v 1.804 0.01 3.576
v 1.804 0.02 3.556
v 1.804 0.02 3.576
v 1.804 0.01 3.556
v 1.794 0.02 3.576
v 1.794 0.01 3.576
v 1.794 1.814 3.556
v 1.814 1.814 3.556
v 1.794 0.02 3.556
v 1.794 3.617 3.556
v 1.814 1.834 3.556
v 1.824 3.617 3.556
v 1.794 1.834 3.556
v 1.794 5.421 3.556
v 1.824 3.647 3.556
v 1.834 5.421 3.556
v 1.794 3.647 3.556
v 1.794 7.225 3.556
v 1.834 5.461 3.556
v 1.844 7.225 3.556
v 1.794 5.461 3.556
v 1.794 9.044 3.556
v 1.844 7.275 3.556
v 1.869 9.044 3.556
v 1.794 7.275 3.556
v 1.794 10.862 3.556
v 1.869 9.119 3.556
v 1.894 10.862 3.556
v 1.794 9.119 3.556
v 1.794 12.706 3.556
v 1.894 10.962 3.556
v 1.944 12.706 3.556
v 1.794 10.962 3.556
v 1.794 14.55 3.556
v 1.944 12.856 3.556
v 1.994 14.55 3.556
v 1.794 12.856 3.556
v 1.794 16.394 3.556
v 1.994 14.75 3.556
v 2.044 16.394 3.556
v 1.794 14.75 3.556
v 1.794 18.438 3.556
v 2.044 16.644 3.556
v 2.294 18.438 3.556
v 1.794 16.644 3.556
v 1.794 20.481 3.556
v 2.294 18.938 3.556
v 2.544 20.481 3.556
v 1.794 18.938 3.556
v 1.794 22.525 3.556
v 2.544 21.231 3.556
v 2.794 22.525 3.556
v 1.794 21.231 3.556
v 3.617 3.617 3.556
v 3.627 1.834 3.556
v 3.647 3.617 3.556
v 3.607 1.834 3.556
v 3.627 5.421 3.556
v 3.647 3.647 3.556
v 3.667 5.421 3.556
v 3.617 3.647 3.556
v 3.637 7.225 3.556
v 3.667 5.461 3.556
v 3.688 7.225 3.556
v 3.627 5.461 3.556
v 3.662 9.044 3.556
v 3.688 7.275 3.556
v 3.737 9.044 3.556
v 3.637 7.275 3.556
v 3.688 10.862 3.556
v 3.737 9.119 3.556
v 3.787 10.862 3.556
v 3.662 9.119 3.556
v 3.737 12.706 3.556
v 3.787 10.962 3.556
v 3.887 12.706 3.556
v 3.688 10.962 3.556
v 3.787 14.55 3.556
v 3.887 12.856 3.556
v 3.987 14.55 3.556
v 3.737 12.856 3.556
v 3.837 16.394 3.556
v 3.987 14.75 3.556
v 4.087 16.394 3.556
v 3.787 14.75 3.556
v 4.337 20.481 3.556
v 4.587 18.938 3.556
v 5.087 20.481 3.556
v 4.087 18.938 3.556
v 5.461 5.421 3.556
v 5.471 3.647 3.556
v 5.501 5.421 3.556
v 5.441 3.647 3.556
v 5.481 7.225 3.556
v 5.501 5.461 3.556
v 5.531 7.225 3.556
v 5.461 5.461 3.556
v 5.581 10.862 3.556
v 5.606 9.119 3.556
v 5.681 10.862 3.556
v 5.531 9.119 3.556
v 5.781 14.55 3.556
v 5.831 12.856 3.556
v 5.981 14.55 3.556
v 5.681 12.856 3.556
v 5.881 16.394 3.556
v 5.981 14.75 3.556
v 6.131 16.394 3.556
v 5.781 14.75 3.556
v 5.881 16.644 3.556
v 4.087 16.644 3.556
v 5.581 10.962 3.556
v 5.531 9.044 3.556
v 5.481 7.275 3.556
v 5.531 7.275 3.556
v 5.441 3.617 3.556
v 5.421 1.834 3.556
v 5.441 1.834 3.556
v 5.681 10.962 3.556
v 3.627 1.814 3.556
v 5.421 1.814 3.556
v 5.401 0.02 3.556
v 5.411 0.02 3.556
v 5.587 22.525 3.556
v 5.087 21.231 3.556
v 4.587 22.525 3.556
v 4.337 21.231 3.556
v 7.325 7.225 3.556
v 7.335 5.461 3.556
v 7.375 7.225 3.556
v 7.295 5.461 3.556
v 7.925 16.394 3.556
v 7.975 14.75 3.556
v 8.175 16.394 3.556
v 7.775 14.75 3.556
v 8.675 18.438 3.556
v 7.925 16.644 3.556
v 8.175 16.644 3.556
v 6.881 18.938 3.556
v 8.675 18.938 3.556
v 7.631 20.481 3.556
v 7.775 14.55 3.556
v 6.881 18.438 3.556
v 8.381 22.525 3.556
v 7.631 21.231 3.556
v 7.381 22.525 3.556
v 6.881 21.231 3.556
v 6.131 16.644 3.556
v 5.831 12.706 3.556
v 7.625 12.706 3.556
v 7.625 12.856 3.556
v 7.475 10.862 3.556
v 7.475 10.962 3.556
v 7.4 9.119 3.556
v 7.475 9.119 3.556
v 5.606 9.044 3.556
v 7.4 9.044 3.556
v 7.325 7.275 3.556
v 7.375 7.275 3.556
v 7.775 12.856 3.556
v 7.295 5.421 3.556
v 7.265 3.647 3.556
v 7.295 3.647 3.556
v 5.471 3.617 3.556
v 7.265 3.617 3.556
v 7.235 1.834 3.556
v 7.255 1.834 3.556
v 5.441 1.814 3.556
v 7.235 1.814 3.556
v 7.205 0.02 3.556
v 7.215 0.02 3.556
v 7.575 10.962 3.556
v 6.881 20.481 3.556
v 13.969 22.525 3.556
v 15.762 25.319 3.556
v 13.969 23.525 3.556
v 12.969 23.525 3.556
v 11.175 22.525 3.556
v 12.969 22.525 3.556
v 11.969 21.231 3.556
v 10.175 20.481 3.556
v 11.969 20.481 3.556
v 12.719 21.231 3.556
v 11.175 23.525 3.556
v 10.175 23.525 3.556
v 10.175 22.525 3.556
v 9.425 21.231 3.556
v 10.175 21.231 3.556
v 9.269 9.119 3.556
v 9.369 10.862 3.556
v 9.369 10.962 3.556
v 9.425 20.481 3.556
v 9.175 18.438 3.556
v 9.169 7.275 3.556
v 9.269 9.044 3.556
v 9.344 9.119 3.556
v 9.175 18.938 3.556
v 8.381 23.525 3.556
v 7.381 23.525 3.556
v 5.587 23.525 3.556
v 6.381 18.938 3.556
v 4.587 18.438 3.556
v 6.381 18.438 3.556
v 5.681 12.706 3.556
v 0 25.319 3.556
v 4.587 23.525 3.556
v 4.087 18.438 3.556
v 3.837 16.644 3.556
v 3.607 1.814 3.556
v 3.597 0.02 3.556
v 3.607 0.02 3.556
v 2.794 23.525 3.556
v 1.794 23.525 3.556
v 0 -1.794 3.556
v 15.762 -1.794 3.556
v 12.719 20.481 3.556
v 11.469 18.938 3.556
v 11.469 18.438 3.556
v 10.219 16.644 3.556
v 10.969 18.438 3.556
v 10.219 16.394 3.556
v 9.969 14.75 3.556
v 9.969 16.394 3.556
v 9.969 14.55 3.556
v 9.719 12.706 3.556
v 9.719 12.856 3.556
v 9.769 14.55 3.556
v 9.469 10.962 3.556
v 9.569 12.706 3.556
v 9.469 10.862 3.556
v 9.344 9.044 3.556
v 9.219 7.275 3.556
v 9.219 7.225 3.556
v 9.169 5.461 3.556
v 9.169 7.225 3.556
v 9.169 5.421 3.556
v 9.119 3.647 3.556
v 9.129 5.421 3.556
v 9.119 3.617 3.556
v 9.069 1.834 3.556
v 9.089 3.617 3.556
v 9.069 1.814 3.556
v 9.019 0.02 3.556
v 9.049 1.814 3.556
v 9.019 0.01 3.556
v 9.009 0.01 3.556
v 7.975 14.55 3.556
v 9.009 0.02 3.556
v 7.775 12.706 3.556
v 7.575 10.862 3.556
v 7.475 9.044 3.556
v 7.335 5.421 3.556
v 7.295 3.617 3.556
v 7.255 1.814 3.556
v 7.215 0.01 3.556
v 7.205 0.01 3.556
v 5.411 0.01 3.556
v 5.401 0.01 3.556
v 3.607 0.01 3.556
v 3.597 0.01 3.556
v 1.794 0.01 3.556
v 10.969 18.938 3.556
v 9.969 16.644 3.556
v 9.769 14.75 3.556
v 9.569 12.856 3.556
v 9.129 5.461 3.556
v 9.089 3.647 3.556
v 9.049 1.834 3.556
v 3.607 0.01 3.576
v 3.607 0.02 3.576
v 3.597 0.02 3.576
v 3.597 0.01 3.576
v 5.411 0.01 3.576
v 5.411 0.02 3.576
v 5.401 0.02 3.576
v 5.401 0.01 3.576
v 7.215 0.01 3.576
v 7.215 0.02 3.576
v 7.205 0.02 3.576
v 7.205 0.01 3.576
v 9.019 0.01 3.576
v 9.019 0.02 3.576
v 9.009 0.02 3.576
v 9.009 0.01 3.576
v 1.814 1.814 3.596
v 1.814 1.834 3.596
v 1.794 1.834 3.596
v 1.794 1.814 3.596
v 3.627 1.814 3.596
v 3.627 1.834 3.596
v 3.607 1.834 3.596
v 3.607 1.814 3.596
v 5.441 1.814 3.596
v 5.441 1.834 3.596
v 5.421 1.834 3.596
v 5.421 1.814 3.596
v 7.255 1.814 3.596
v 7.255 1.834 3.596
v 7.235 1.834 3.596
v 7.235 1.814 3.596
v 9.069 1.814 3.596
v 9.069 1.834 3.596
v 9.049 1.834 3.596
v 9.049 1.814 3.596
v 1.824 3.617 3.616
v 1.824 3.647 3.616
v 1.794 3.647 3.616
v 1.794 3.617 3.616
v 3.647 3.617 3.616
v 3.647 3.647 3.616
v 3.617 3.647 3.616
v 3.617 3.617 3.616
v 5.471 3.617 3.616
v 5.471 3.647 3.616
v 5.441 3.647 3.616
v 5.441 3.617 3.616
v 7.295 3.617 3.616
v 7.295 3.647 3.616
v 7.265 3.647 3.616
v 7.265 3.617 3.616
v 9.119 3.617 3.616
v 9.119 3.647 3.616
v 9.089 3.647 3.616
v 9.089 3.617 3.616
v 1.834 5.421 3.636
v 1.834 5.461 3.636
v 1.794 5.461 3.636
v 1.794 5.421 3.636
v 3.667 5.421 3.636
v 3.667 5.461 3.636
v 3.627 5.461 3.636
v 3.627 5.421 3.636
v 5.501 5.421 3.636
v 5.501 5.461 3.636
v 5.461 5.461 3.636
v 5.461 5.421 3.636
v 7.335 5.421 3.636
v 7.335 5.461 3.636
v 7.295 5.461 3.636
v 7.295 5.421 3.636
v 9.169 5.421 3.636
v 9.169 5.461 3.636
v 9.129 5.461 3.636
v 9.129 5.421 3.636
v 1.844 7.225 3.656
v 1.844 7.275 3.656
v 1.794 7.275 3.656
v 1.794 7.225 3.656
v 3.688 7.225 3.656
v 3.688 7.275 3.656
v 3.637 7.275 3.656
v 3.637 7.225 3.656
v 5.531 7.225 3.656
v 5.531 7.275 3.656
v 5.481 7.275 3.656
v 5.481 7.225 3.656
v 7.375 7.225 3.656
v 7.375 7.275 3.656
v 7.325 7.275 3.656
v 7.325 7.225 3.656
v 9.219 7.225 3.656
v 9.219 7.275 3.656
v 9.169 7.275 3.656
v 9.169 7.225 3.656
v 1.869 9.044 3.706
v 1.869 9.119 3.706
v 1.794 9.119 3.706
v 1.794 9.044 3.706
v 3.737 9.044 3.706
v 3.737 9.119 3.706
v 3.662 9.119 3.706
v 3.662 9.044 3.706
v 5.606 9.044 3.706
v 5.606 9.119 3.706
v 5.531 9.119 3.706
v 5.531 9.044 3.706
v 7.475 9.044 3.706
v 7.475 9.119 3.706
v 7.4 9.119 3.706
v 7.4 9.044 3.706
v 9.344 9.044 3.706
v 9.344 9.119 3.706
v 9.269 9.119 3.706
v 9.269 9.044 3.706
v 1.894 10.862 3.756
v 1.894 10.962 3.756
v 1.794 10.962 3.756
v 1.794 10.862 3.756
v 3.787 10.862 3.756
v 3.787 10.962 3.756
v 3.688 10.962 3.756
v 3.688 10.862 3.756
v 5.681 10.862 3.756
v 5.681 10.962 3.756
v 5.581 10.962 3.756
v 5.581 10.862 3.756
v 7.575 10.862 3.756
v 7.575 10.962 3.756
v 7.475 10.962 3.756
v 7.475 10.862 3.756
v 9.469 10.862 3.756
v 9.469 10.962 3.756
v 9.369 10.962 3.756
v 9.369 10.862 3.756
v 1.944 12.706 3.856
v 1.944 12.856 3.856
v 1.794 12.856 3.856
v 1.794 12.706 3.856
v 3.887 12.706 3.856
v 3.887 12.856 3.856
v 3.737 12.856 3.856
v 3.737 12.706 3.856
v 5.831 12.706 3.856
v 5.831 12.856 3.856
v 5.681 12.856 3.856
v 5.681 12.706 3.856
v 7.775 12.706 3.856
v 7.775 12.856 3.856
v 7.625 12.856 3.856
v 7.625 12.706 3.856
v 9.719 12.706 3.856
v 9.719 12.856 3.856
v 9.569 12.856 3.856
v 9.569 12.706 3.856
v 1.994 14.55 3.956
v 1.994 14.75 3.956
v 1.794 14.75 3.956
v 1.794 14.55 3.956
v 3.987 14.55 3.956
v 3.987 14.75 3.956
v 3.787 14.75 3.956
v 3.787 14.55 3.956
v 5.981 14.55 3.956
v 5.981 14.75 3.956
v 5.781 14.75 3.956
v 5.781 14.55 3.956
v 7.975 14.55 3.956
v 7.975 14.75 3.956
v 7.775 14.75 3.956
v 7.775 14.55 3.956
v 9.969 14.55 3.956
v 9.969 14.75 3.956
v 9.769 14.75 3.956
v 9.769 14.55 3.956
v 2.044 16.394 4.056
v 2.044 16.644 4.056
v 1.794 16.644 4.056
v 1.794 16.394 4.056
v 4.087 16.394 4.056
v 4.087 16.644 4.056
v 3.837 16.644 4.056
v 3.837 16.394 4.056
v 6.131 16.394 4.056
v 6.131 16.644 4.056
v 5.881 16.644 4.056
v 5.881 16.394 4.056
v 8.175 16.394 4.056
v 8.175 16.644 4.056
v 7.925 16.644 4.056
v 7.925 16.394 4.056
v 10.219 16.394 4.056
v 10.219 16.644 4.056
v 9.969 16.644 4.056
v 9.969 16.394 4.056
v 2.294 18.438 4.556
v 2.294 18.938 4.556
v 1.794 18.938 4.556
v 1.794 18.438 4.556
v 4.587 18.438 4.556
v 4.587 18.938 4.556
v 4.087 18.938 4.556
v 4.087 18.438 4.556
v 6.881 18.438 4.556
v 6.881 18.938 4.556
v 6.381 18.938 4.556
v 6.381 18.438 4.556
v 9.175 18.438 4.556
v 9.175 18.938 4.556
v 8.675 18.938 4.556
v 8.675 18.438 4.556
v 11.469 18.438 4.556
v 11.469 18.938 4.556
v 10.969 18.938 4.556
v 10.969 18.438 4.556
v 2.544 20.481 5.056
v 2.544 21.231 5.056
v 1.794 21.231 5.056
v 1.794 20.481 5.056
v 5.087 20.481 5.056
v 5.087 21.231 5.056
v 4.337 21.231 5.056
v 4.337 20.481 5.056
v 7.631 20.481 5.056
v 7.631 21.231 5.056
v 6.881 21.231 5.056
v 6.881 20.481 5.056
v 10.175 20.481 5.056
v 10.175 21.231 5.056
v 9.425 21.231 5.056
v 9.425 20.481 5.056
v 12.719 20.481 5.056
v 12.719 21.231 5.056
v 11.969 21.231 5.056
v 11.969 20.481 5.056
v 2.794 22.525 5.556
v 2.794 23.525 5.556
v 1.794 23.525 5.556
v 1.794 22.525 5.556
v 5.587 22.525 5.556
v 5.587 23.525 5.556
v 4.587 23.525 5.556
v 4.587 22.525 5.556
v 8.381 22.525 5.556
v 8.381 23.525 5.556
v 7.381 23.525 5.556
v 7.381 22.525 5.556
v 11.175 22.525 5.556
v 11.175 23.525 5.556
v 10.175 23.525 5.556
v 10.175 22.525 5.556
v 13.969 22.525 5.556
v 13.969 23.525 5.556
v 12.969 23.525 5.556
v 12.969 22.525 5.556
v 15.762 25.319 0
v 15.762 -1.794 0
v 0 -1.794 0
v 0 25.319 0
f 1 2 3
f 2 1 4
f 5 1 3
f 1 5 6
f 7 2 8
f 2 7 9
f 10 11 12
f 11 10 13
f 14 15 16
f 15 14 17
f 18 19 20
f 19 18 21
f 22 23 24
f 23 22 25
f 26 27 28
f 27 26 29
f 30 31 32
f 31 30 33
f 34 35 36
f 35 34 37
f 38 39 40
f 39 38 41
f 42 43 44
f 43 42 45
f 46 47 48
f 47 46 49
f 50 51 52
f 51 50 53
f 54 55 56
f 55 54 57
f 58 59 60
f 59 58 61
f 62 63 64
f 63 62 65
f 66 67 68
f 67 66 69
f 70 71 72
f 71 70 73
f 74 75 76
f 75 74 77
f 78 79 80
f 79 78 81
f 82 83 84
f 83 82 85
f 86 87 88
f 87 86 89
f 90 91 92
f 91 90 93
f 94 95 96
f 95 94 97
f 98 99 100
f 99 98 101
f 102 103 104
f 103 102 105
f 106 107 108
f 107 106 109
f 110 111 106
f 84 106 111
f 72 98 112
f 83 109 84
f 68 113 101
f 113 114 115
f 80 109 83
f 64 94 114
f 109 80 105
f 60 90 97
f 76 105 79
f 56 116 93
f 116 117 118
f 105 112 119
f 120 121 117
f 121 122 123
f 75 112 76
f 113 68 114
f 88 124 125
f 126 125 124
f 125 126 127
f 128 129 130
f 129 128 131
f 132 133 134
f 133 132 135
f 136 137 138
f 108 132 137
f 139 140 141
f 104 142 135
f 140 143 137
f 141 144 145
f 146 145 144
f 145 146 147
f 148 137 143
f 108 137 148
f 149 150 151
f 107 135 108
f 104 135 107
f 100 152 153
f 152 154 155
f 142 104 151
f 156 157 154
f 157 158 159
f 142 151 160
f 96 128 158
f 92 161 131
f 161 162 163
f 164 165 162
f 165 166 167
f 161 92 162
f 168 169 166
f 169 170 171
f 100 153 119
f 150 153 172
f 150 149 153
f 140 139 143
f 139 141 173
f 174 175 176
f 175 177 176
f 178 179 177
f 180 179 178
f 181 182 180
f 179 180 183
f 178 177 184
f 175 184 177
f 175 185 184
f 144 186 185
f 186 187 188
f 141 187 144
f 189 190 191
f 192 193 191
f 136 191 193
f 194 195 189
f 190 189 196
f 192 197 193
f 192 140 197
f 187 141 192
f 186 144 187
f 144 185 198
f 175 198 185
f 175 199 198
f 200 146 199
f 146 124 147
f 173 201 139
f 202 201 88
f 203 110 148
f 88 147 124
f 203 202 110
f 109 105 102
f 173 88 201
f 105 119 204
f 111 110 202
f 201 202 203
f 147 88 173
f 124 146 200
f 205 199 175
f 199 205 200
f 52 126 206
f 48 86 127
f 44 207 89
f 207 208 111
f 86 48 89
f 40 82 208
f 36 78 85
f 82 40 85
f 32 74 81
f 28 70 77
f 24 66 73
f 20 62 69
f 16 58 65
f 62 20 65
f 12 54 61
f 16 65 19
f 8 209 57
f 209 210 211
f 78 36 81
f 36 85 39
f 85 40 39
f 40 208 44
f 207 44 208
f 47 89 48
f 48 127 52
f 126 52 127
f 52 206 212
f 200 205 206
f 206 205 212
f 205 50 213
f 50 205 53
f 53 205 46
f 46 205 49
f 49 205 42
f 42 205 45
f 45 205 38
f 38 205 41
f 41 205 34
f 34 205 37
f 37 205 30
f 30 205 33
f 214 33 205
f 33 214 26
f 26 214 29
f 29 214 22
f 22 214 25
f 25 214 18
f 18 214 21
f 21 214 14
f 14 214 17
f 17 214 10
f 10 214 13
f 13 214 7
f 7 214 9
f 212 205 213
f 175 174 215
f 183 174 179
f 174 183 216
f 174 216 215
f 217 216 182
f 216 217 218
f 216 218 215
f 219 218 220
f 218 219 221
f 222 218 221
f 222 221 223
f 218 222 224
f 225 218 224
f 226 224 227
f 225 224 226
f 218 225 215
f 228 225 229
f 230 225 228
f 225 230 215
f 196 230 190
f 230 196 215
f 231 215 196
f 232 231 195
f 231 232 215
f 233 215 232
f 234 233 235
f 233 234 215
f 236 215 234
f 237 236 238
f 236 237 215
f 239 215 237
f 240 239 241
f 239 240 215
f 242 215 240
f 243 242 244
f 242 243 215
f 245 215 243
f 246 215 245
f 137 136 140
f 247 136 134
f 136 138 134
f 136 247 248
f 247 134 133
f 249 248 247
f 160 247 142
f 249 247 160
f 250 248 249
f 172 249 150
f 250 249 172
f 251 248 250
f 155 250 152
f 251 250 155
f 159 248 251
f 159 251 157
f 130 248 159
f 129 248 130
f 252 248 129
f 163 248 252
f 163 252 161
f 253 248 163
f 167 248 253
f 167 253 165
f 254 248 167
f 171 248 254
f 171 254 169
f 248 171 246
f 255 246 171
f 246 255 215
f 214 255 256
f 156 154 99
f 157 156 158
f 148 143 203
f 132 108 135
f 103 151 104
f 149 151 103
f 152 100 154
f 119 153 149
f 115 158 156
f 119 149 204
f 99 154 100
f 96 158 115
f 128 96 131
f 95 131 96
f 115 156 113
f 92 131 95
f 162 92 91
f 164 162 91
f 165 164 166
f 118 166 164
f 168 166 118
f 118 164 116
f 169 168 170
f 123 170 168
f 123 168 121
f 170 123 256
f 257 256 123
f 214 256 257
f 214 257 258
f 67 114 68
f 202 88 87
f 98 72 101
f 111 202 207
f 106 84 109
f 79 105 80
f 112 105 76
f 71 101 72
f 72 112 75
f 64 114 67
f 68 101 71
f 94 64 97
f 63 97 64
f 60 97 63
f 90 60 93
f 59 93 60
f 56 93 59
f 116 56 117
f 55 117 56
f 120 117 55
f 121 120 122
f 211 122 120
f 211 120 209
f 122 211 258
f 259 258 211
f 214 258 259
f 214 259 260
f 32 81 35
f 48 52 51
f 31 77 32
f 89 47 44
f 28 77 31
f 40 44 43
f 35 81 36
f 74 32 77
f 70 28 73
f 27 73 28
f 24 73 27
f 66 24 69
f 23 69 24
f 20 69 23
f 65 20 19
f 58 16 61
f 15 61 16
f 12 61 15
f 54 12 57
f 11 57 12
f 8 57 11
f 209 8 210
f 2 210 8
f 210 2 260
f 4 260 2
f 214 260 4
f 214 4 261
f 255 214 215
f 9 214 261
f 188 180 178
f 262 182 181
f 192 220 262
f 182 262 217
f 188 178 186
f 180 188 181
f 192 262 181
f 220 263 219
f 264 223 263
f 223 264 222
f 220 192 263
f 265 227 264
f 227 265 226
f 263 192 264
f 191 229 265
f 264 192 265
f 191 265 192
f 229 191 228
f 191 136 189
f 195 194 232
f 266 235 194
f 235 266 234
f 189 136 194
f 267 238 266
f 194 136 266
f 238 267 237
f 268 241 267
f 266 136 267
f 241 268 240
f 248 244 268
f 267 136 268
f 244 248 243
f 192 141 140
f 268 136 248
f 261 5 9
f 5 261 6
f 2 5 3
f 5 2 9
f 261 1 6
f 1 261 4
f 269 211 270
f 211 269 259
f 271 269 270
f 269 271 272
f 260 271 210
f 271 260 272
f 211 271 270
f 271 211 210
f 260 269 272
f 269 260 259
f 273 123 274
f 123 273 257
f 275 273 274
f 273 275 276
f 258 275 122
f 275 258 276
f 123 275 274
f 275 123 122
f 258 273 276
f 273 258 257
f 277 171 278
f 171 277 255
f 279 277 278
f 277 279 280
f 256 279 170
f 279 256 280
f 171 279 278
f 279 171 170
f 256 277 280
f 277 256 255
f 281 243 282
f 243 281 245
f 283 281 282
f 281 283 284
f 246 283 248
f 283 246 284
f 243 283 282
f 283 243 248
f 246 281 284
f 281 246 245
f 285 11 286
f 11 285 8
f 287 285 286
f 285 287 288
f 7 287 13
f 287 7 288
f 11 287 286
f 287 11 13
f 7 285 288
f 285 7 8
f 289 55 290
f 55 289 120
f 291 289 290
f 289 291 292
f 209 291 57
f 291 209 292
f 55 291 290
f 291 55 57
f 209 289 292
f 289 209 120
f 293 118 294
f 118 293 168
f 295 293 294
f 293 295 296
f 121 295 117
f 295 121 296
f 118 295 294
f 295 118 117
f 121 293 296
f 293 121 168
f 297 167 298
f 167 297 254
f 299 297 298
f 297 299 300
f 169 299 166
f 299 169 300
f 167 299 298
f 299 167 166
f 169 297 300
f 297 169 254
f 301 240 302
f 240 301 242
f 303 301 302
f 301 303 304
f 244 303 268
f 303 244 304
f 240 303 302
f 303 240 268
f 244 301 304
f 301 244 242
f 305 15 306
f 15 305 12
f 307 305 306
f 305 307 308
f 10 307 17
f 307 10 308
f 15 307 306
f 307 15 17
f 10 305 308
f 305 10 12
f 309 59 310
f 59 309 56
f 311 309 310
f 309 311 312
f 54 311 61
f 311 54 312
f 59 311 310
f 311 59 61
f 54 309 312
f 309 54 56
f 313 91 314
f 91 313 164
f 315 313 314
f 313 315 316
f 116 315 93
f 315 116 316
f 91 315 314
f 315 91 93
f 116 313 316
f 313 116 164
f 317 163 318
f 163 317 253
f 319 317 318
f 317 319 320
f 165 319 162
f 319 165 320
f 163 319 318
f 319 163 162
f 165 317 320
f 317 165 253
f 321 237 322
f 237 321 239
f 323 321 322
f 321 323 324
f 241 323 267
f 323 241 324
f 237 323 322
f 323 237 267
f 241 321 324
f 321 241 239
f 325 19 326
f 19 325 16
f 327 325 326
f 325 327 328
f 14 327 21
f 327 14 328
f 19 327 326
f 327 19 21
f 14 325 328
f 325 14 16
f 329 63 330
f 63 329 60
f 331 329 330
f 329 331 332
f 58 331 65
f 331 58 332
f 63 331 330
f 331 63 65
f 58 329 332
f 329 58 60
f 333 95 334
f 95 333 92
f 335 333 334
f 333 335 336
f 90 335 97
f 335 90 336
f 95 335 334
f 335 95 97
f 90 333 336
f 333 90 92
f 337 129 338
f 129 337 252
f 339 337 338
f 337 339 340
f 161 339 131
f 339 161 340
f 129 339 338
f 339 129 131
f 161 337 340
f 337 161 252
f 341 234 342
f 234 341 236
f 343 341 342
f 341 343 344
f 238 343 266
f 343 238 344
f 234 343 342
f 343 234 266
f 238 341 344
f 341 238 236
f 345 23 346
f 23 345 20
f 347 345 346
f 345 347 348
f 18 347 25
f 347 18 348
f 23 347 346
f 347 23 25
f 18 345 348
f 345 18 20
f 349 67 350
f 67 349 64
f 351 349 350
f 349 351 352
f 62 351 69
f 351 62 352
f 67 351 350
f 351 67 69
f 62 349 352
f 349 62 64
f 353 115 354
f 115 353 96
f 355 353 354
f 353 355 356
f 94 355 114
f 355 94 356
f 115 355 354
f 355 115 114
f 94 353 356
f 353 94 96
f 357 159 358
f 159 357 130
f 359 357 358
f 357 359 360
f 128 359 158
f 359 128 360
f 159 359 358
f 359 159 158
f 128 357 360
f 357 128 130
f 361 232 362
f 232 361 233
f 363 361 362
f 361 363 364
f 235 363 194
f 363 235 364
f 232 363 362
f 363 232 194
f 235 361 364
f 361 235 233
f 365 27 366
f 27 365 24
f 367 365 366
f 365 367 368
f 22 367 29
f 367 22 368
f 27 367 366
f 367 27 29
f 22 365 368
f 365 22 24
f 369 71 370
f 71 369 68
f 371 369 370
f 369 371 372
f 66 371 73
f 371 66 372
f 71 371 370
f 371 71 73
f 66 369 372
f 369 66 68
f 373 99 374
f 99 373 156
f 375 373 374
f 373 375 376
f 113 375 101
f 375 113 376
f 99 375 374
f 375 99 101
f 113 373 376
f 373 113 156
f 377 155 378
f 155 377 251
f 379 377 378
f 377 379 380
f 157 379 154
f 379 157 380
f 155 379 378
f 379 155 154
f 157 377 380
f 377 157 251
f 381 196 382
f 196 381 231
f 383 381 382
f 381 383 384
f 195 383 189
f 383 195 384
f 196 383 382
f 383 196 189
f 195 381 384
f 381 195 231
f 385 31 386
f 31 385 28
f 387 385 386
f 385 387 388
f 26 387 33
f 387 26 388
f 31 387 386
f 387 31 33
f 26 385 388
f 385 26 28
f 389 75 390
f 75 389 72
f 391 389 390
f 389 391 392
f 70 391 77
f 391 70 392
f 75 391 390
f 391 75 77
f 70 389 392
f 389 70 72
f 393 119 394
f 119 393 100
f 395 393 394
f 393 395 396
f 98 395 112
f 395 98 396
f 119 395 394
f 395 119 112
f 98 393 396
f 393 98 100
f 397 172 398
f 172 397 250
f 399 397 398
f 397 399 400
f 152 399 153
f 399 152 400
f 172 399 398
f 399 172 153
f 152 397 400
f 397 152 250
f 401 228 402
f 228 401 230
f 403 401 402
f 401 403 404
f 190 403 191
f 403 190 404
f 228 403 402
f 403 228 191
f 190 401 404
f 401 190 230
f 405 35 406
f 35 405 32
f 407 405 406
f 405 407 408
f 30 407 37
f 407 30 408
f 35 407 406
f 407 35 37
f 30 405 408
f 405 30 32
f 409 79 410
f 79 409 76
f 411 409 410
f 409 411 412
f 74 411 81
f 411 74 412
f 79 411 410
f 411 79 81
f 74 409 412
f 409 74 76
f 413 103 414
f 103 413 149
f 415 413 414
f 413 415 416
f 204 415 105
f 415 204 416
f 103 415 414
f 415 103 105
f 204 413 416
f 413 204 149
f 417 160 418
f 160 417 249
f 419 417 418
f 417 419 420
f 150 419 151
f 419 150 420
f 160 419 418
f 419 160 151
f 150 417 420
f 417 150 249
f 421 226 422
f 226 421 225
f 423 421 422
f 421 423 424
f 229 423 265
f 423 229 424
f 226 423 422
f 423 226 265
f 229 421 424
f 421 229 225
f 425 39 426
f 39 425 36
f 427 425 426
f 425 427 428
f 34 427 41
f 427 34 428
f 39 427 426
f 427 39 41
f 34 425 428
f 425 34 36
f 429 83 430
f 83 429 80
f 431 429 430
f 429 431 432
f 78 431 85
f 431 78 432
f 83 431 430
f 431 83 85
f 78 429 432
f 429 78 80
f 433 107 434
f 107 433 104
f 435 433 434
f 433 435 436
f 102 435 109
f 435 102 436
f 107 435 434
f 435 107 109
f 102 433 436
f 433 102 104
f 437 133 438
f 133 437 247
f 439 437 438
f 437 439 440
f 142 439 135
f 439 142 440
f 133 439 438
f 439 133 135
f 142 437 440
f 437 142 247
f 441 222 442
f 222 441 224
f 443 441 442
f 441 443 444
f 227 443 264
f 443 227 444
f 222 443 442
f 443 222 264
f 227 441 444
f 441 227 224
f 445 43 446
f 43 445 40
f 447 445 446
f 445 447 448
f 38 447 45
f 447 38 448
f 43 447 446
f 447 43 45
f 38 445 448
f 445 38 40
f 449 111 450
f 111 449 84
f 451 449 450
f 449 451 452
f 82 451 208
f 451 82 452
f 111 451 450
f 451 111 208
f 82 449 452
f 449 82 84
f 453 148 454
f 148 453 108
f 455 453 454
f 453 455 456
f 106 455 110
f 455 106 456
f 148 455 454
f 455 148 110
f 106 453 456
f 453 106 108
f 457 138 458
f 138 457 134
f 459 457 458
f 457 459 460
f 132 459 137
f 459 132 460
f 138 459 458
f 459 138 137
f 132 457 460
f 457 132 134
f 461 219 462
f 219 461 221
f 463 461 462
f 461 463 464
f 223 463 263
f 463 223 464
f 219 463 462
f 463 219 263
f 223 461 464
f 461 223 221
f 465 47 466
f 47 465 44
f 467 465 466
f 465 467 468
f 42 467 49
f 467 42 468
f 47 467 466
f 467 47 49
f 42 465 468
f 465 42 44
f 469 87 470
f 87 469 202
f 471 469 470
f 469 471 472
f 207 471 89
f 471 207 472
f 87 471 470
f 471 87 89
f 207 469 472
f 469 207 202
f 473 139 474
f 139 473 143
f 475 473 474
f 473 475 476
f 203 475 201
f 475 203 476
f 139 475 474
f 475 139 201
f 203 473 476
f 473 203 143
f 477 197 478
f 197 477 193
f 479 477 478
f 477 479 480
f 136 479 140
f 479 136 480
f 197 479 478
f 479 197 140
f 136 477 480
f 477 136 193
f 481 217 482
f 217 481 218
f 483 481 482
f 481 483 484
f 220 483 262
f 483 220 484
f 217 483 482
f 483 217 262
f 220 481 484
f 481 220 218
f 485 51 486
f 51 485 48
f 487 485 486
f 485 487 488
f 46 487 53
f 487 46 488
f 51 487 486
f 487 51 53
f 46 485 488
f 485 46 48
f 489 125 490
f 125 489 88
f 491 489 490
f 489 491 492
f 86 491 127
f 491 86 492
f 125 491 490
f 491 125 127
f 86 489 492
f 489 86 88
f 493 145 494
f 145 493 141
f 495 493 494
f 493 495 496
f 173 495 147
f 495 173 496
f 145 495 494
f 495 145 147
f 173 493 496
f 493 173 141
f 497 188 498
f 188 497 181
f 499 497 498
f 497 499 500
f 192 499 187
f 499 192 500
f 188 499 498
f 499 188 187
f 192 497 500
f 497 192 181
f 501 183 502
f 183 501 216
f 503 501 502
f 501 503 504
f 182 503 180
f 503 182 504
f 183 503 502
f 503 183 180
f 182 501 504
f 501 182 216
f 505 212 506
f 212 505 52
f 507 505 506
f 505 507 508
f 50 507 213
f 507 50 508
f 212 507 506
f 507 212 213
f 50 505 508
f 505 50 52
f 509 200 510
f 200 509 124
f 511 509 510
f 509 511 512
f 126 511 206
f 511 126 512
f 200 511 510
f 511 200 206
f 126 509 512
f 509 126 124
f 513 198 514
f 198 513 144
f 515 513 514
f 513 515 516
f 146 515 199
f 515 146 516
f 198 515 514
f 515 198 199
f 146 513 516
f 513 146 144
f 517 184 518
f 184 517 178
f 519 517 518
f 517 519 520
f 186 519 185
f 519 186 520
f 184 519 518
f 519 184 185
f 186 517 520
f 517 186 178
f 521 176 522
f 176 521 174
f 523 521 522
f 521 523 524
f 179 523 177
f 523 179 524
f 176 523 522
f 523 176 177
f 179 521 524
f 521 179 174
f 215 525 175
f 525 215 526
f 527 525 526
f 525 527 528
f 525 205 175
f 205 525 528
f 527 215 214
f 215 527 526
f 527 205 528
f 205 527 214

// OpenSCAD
//Parameters
  //Number of technical replicates
  numReplications = 5;	
  //Cube sizes to test
  cubeSize = [0.01, 0.02, 0.03, 0.04, 0.05, 0.075, 0.1, 0.15, 0.2, 0.25, 0.5, 0.75, 1];
  //End mill diameter 
  endMillD = 0.79375;  //1/32"
  aspectRatio = 2;     //Aspect ratio of test cube
  stockZ = 5.556;

//Maths
  //Add 1mm to end mill diameter to space out replicates
  CubeZ = max(cubeSize)*aspectRatio;
  Spacing = endMillD + 1;
  StockX = ((max(cubeSize)+Spacing)*numReplications);
  StockZ = stockZ - CubeZ; 
  NumOfCubeSizes = len(cubeSize);
  
//uncomment to render
testDevice();

//Module Definition
module testDevice(){
  //Draw stock
  hull(){
    translate([0,-Spacing,0])cube([Spacing+StockX,Spacing,StockZ], center=false);
    for(i = [0 : len(cubeSize)-1]){
      let (YLocation = cubeSize[i]+i*Spacing){
	for (j = [0: numReplications-1]){
	  if (i==len(cubeSize)-1)translate([0,YLocation,0])cube([1,Spacing+cubeSize[i],StockZ], center=false);
	  translate([Spacing+(j*(cubeSize[i]+Spacing)),YLocation,0]){
	    cube([Spacing+cubeSize[i], Spacing+cubeSize[i], StockZ], center=false);
	  }
	}
      }
    }
  }

  //Make test structures 
  for(i = [0 : len(cubeSize)-1]){
    let (YLocation = cubeSize[i]+i*Spacing){
      for (j = [0: numReplications-1]){
        translate([Spacing+(j*(cubeSize[i]+Spacing)),YLocation,StockZ]){
          cube([cubeSize[i], cubeSize[i], cubeSize[i]*aspectRatio], center=false);
        }
      }
    }
  }
}
